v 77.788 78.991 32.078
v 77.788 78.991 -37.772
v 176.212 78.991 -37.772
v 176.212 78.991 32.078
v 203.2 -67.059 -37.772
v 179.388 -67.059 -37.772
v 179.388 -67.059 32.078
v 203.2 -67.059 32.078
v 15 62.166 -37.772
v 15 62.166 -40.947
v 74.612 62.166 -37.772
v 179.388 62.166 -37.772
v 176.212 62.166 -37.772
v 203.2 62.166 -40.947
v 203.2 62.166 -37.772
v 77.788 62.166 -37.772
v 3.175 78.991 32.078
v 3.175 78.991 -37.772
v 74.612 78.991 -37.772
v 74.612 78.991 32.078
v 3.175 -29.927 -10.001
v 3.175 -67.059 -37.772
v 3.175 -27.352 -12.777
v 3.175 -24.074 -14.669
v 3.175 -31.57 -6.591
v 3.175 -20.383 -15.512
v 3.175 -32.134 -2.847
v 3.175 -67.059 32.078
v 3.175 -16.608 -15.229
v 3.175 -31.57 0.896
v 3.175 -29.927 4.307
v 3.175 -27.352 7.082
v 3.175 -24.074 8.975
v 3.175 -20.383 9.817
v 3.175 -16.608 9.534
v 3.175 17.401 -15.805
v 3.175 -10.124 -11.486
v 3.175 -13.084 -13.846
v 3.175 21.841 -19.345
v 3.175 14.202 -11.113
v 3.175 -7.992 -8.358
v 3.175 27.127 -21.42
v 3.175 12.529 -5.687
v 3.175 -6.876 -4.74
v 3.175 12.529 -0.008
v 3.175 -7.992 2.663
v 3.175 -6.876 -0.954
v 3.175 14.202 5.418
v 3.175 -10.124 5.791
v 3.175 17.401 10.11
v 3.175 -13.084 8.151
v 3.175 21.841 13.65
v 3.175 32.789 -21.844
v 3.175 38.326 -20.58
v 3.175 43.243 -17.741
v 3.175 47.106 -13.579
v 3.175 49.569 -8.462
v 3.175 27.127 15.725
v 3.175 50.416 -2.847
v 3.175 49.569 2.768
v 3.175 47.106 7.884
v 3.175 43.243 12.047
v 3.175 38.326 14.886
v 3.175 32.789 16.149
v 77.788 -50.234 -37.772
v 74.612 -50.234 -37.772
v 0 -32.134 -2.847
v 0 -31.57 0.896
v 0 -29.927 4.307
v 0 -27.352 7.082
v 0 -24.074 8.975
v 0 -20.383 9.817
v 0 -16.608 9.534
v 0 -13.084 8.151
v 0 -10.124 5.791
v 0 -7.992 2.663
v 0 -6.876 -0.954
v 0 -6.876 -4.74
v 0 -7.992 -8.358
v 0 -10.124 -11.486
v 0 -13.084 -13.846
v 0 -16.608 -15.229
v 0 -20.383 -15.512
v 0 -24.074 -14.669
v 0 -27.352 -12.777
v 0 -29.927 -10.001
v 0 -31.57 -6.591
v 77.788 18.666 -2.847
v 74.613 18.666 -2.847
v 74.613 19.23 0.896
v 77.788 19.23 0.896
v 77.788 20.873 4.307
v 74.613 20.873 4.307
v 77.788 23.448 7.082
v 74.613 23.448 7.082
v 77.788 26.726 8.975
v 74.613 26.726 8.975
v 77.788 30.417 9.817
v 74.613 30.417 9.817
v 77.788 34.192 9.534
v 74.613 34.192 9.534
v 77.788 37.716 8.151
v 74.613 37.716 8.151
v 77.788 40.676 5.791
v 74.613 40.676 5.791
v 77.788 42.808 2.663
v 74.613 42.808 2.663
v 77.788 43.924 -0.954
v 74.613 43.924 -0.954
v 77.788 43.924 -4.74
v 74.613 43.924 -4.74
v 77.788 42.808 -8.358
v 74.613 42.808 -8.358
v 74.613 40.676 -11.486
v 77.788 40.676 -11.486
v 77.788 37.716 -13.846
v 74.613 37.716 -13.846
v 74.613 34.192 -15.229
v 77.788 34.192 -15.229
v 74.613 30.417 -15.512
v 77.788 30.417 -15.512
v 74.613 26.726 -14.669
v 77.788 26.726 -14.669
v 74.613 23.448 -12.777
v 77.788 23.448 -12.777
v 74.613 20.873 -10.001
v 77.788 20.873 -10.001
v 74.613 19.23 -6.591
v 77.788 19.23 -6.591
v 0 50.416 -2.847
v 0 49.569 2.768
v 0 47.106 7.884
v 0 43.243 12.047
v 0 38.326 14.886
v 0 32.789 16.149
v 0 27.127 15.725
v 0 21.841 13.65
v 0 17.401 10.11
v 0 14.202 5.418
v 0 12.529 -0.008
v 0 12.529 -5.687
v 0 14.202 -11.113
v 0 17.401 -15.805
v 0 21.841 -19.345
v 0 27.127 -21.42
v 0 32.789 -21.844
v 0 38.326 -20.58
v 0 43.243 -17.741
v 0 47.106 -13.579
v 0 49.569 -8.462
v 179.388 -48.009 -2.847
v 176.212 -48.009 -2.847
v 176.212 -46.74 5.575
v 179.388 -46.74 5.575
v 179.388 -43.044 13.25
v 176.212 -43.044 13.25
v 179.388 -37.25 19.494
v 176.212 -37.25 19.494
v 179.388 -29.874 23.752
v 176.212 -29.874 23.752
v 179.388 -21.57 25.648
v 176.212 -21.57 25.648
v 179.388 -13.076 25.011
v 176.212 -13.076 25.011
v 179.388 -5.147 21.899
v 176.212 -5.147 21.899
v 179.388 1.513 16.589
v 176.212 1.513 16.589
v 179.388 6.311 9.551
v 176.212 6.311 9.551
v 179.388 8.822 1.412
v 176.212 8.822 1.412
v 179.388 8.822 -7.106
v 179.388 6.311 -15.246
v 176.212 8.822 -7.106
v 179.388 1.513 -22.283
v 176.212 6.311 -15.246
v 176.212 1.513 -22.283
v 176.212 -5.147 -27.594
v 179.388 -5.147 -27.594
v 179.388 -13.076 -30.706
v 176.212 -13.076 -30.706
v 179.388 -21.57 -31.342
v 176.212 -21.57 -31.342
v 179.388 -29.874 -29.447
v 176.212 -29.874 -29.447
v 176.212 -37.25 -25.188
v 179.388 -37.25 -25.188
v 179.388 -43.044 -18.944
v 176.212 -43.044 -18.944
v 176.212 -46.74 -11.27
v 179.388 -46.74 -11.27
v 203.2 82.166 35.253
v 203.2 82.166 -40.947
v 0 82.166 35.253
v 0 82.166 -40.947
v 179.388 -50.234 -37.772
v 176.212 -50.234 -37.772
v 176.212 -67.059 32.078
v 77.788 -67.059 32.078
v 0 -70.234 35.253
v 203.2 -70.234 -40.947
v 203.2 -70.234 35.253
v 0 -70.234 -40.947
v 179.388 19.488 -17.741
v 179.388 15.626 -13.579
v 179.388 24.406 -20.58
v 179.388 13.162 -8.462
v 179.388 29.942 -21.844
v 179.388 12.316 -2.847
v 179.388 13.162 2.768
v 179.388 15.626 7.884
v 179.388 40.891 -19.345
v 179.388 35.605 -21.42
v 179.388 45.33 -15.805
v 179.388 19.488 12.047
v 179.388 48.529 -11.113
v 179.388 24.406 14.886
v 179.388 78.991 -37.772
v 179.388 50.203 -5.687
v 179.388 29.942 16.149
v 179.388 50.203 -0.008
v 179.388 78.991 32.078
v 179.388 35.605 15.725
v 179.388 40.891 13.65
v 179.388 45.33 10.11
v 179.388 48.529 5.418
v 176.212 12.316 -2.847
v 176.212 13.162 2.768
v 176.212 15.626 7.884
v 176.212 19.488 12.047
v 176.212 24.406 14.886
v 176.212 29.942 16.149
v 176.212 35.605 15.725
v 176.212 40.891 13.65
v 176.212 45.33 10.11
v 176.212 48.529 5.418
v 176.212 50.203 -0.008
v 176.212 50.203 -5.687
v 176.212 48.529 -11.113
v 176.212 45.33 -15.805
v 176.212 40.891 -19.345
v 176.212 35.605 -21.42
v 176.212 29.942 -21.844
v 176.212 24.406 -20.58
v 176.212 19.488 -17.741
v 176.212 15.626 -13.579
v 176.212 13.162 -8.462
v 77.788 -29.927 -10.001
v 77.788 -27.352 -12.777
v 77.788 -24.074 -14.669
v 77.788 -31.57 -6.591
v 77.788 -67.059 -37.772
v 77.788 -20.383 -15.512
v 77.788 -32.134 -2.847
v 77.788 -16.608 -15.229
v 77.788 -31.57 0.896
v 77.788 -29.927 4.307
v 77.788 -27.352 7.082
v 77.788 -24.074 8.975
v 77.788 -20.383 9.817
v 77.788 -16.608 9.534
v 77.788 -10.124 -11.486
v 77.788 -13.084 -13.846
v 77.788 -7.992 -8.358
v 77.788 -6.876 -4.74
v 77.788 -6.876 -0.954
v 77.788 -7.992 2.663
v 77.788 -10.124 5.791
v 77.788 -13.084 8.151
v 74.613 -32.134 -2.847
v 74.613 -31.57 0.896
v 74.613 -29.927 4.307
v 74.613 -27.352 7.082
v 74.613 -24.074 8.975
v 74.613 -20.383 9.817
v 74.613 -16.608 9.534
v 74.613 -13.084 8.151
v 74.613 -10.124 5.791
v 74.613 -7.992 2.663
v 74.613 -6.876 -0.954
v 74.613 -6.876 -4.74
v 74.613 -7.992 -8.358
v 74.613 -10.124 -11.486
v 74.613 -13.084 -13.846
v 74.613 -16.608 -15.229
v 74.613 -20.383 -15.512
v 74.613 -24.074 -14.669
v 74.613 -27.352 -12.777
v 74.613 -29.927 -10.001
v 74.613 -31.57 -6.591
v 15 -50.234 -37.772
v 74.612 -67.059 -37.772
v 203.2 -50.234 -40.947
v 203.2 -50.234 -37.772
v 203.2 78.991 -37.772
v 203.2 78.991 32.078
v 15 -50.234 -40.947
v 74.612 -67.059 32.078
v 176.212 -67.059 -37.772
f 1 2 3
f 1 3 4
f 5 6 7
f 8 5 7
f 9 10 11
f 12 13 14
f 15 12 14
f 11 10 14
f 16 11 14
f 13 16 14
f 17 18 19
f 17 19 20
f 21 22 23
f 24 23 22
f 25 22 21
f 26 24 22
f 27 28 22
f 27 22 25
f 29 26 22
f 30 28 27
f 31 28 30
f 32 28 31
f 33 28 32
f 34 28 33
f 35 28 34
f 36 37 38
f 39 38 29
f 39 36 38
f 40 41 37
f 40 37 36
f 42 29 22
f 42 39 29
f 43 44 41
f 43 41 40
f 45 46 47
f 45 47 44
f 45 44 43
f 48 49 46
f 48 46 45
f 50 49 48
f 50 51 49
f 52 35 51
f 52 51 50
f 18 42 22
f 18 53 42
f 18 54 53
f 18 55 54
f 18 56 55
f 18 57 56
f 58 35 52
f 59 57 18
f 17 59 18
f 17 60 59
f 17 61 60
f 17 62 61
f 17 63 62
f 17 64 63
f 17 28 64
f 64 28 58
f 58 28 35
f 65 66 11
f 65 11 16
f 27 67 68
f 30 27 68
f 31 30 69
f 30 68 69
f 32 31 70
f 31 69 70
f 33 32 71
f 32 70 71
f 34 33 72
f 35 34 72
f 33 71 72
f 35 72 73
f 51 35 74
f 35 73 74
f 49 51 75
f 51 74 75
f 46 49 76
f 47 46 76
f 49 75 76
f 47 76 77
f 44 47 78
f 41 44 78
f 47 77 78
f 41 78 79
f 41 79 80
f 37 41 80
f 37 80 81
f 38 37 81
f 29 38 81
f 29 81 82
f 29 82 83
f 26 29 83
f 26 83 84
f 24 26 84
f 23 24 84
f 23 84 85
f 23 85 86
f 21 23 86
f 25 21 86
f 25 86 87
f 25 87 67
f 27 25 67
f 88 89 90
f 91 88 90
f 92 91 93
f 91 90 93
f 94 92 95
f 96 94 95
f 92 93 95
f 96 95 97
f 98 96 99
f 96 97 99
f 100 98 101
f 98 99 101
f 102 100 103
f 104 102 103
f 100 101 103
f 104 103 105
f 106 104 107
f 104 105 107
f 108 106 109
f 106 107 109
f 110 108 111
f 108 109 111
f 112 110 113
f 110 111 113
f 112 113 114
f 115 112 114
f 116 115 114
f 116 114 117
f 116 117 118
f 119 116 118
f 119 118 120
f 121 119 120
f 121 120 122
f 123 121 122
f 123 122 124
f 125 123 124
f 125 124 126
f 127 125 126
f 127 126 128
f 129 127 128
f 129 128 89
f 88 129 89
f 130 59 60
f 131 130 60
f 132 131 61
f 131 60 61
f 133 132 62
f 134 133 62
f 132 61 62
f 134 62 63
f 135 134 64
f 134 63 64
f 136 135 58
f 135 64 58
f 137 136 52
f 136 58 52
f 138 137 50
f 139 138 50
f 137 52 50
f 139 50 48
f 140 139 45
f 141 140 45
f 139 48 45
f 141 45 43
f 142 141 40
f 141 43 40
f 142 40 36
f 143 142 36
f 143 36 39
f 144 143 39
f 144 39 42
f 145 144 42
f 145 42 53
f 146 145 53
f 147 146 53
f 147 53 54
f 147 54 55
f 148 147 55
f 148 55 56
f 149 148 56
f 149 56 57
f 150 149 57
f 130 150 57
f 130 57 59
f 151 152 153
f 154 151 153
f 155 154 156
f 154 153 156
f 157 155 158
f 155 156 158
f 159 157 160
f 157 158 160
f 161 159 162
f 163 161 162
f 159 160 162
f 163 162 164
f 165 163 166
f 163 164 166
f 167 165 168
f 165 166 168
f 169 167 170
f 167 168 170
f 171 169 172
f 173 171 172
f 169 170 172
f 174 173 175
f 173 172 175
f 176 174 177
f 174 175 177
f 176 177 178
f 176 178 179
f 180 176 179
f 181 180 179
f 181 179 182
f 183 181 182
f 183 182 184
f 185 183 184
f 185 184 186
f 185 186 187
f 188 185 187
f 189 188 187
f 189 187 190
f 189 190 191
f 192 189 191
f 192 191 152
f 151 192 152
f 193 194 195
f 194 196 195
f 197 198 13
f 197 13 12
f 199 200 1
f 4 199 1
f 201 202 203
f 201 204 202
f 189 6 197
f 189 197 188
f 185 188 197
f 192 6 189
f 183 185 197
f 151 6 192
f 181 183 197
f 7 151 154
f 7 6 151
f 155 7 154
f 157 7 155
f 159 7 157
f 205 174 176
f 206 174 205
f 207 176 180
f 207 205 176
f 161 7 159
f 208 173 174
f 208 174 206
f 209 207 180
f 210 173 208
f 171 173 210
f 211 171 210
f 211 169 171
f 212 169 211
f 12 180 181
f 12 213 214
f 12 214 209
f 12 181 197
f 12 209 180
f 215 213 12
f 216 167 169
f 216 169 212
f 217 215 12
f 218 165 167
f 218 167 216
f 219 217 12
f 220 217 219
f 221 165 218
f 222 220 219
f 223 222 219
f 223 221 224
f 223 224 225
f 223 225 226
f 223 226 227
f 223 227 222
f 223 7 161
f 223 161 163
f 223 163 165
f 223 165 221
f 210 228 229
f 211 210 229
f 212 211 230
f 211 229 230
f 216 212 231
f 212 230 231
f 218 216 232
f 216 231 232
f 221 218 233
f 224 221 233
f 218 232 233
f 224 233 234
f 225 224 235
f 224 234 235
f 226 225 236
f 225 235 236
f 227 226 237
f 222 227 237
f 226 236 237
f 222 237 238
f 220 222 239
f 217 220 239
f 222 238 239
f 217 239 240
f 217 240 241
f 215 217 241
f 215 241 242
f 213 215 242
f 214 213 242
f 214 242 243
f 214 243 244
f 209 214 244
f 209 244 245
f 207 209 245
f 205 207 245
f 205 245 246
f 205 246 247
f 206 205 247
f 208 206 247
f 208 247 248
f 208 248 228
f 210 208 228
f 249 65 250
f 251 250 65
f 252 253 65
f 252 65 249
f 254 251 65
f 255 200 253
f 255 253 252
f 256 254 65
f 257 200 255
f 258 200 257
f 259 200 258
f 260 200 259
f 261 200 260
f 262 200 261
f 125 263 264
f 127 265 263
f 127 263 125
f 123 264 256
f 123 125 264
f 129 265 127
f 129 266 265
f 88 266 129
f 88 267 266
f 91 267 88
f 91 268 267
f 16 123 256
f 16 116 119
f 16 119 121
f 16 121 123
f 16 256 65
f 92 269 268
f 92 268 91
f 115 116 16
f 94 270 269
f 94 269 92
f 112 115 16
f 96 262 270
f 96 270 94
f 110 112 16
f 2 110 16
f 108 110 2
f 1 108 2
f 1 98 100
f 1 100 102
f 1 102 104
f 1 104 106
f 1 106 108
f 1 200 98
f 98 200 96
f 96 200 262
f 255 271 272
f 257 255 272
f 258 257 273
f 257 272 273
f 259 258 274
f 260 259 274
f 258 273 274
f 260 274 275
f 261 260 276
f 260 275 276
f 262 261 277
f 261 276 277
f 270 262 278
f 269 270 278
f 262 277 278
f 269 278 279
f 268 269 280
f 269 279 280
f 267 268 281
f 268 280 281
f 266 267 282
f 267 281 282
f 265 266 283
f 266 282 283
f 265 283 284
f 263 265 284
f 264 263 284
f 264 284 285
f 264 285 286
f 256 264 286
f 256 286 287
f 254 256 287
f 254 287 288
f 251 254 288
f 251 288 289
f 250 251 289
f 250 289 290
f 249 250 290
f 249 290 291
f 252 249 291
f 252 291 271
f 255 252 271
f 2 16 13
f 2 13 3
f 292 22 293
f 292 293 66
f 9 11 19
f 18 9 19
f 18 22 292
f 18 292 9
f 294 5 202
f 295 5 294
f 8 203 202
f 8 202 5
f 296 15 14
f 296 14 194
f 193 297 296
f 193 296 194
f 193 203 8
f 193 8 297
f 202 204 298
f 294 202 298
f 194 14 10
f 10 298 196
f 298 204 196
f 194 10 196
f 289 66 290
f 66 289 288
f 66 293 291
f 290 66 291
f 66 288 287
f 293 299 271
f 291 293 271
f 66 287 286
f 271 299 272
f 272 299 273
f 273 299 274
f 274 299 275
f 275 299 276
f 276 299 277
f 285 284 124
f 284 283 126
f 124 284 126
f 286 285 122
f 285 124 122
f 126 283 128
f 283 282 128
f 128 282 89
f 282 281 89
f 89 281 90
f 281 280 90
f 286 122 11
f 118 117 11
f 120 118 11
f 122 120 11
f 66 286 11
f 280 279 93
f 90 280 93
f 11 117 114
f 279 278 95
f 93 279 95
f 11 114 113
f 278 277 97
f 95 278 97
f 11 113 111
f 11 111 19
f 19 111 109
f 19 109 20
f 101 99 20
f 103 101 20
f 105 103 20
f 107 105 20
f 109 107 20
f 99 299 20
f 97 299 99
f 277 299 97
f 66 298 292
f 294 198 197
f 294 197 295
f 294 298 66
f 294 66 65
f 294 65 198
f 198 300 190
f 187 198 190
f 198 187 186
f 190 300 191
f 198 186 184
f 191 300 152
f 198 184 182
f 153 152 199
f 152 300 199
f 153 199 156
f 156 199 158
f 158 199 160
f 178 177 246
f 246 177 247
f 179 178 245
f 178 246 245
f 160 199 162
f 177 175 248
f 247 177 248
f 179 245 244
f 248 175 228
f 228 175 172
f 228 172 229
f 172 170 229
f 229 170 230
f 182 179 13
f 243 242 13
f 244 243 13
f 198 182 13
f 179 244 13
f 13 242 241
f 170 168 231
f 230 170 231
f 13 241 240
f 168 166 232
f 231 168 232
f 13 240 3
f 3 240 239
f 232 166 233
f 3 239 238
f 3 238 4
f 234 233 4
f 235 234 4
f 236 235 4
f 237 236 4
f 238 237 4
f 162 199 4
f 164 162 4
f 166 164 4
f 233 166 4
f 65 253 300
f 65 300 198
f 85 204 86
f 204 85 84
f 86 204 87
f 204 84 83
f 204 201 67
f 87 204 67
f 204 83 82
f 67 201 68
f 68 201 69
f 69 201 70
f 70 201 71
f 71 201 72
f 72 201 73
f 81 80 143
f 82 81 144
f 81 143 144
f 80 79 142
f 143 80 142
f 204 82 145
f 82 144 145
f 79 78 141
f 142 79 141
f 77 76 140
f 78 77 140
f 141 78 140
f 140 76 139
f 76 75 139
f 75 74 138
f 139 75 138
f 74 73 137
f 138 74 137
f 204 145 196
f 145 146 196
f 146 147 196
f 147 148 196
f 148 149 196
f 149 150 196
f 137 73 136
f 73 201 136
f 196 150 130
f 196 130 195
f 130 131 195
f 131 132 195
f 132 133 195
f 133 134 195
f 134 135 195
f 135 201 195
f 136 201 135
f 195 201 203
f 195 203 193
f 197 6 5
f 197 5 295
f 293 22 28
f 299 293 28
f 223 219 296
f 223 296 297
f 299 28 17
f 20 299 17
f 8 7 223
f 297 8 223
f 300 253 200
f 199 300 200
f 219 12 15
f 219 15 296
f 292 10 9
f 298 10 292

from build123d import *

# Parameters (mm, degrees)
SKETCH2_W                      = 152.4
SKETCH2_H                      = 76.2
BOSS_EXTRUDE1_DEPTH            = 3.175
SKETCH3_W                      = 152.4
SKETCH3_H                      = 76.2
SKETCH3_W_2                    = 146.05
SKETCH3_H_2                    = 69.85
BOSS_EXTRUDE2_DEPTH            = 71.4375
SKETCH4_W                      = 152.4
SKETCH4_H                      = 76.2
BOSS_EXTRUDE3_DEPTH            = 3.175
SKETCH5_W                      = 152.4
SKETCH5_H                      = 76.2
SKETCH5_W_2                    = 146.05
SKETCH5_H_2                    = 69.85
BOSS_EXTRUDE4_DEPTH            = 98.425
F_97_1_DIAMETER_HOLE1_D        = 25.4
F_97_1_5_DIAMETER_HOLE1_D      = 38.1
F_97_1_5_DIAMETER_HOLE1_DEPTH  = 6.35
SKETCH6_W                      = 152.4
SKETCH6_H                      = 76.2
BOSS_EXTRUDE6_DEPTH            = 3.175
F_97_1_5_DIAMETER_HOLE2_D      = 38.1
F_97_1_5_DIAMETER_HOLE2_DEPTH  = 6.35
F_97_2_25_DIAMETER_HOLE1_D     = 57.15
F_97_2_25_DIAMETER_HOLE1_DEPTH = 6.35
SKETCH16_W                     = 152.4
SKETCH16_H                     = 76.2
SKETCH16_W_2                   = 146.05
SKETCH16_H_2                   = 69.85
BOSS_EXTRUDE7_DEPTH            = 23.8125
SKETCH17_W                     = 188.2
SKETCH17_H                     = 112.4
CUT_EXTRUDE1_DEPTH             = 3.175


with BuildPart() as part:
    # Sketch2 → Boss-Extrude1 (new body)
    with BuildSketch(Plane.YZ):
        with Locations((5.965836299, -2.847330961)):
            Rectangle(SKETCH2_W, SKETCH2_H)
    extrude(amount=BOSS_EXTRUDE1_DEPTH)

    # Sketch3 → Boss-Extrude2 (add)
    with BuildSketch(Plane.YZ.offset(3.175)):
        with Locations((5.965836299, -2.847330961)):
            Rectangle(SKETCH3_W, SKETCH3_H)
        with Locations((5.965836299, -2.847330961)):
            Rectangle(SKETCH3_W_2, SKETCH3_H_2, mode=Mode.SUBTRACT)
    extrude(amount=BOSS_EXTRUDE2_DEPTH)

    # Sketch4 → Boss-Extrude3 (add)
    with BuildSketch(Plane.YZ.offset(74.6125)):
        with Locations((5.965836299, -2.847330961)):
            Rectangle(SKETCH4_W, SKETCH4_H)
    extrude(amount=BOSS_EXTRUDE3_DEPTH)

    # Sketch5 → Boss-Extrude4 (add)
    with BuildSketch(Plane.YZ.offset(77.7875)):
        with Locations((5.965836299, -2.847330961)):
            Rectangle(SKETCH5_W, SKETCH5_H)
        with Locations((5.965836299, -2.847330961)):
            Rectangle(SKETCH5_W_2, SKETCH5_H_2, mode=Mode.SUBTRACT)
    extrude(amount=BOSS_EXTRUDE4_DEPTH)

    # #97 (1) Diameter Hole1 (through all)
    with Locations(Plane.YZ.offset(77.7875)):
        with Locations((-19.434163701, -2.847330961), (31.365836299, -2.847330961)):
            Hole(F_97_1_DIAMETER_HOLE1_D / 2)

    # #97 (1.5) Diameter Hole1
    with Locations(Plane(origin=(0, 0, 0), x_dir=(0, -1, 0), z_dir=(-1, 0, 0))):
        with Locations((-31.365836299, -2.847330961)):
            Hole(F_97_1_5_DIAMETER_HOLE1_D / 2, depth=F_97_1_5_DIAMETER_HOLE1_DEPTH)

    # Sketch6 → Boss-Extrude6 (add)
    with BuildSketch(Plane.YZ.offset(176.2125)):
        with Locations((5.965836299, -2.847330961)):
            Rectangle(SKETCH6_W, SKETCH6_H)
    extrude(amount=BOSS_EXTRUDE6_DEPTH)

    # #97 (1.5) Diameter Hole2
    with Locations(Plane.YZ.offset(179.3875)):
        with Locations((31.365836299, -2.847330961)):
            Hole(F_97_1_5_DIAMETER_HOLE2_D / 2, depth=F_97_1_5_DIAMETER_HOLE2_DEPTH)

    # #97 (2.25) Diameter Hole1
    with Locations(Plane.YZ.offset(179.3875)):
        with Locations((-19.434163701, -2.847330961)):
            Hole(F_97_2_25_DIAMETER_HOLE1_D / 2, depth=F_97_2_25_DIAMETER_HOLE1_DEPTH)

    # Sketch16 → Boss-Extrude7 (add)
    with BuildSketch(Plane.YZ.offset(179.3875)):
        with Locations((5.965836299, -2.847330961)):
            Rectangle(SKETCH16_W, SKETCH16_H)
        with Locations((5.965836299, -2.847330961)):
            Rectangle(SKETCH16_W_2, SKETCH16_H_2, mode=Mode.SUBTRACT)
    extrude(amount=BOSS_EXTRUDE7_DEPTH)

    # Sketch17 → Cut-Extrude1 (cut)
    with BuildSketch(Plane(origin=(0, 0, -40.947330961), x_dir=(1, 0, 0), z_dir=(0, 0, -1))):
        with Locations((109.1, -5.965836299)):
            Rectangle(SKETCH17_W, SKETCH17_H)
    extrude(amount=-CUT_EXTRUDE1_DEPTH, mode=Mode.SUBTRACT)


solid = part.part
